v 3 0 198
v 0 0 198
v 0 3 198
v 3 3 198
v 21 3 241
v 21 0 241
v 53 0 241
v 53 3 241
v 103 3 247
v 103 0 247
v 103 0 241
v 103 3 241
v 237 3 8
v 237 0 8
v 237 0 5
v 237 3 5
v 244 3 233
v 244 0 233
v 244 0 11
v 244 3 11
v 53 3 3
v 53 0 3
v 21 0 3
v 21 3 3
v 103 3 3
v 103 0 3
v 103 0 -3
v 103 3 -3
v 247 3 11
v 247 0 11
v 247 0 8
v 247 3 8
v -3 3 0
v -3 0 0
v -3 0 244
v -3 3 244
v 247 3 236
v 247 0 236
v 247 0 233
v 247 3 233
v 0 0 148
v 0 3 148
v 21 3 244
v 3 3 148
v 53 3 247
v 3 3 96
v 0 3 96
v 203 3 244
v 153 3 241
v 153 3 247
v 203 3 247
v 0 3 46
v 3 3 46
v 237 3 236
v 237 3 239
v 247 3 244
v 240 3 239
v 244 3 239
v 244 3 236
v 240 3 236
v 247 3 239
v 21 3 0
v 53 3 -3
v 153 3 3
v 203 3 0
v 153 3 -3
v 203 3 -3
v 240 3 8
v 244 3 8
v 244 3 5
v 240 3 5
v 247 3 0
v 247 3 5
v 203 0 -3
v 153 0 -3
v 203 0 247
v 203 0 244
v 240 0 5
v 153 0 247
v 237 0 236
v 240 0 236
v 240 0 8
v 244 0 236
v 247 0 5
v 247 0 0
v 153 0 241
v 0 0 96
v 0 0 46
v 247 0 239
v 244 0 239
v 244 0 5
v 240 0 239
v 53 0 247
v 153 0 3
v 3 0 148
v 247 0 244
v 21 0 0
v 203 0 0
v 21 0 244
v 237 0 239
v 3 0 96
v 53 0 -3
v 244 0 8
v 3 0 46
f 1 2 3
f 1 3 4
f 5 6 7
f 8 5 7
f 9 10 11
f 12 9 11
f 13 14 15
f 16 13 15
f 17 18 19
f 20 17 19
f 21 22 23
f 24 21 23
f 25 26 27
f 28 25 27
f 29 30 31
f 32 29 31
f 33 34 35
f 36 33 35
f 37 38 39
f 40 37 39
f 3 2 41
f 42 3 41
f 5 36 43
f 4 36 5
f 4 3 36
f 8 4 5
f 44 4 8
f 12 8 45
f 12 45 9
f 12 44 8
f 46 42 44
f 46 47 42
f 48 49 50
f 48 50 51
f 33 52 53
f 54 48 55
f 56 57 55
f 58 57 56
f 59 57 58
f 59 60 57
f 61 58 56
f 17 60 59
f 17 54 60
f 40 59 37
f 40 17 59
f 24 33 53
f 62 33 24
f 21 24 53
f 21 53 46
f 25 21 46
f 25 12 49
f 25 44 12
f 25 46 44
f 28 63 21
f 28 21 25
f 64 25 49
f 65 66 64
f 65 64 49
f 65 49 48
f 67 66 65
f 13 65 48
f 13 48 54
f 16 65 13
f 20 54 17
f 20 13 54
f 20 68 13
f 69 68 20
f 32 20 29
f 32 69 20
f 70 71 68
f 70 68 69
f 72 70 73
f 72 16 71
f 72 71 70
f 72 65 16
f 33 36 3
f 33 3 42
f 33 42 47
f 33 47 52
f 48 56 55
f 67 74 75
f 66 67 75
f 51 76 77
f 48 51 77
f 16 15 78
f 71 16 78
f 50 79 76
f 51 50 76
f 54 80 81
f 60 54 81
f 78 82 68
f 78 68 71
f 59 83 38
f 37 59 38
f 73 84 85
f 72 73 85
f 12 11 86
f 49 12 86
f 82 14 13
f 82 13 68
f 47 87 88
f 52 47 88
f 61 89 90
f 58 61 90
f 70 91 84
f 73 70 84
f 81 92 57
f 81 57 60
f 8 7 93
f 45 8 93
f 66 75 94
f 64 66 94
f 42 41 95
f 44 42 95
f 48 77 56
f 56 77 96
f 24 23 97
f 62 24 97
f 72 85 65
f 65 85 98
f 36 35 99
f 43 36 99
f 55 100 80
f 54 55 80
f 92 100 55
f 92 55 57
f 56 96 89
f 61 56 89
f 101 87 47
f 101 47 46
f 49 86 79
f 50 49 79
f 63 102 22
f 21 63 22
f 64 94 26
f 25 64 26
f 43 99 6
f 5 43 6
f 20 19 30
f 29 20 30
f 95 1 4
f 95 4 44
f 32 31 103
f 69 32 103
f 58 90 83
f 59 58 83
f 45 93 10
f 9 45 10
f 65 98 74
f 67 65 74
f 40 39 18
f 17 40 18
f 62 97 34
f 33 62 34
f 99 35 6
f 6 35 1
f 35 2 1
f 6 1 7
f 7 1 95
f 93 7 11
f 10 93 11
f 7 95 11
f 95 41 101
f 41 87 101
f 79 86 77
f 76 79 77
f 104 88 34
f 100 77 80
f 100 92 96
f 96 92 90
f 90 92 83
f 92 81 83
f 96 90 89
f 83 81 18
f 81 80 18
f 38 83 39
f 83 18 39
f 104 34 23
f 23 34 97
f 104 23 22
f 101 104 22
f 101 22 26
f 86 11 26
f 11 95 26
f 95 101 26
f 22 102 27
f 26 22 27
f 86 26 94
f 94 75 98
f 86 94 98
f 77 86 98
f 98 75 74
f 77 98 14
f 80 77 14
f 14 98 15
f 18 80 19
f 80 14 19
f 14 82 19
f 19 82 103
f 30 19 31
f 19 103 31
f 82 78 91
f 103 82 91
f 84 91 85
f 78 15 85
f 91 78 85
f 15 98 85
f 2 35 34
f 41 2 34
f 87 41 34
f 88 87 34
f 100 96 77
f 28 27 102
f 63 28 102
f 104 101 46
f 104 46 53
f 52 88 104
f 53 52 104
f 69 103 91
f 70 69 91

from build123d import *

# Parameters (mm, degrees)
SKETCH1_W           = 3
SKETCH1_H           = 50
SKETCH1_H_2         = 3
BOSS_EXTRUDE1_DEPTH = 3


with BuildPart() as part:
    # Sketch1 → Boss-Extrude1 (new body)
    with BuildSketch(Plane(origin=(0, 0, 0), x_dir=(1, 0, 0), z_dir=(0, 1, 0))):
        Polygon((247, -244), (247, -239), (244, -239), (244, -236), (247, -236), (247, -233), (244, -233), (244, -11), (247, -11), (247, -8), (244, -8), (244, -5), (247, -5), (247, 0), (203, 0), (203, 3), (153, 3), (153, -3), (103, -3), (103, 3), (53, 3), (53, -3), (21, -3), (21, 0), (0, 0), (-3, 0), (-3, -244), (0, -244), (21, -244), (21, -241), (53, -241), (53, -247), (103, -247), (103, -241), (153, -241), (153, -247), (203, -247), (203, -244), align=None)
        with Locations((1.5, -173)):
            Rectangle(SKETCH1_W, SKETCH1_H, mode=Mode.SUBTRACT)
        with Locations((238.5, -6.5)):
            Rectangle(SKETCH1_W, SKETCH1_H_2, mode=Mode.SUBTRACT)
        with Locations((1.5, -71)):
            Rectangle(SKETCH1_W, SKETCH1_H, mode=Mode.SUBTRACT)
        with Locations((238.5, -237.5)):
            Rectangle(SKETCH1_W, SKETCH1_H_2, mode=Mode.SUBTRACT)
    extrude(amount=BOSS_EXTRUDE1_DEPTH)


solid = part.part
